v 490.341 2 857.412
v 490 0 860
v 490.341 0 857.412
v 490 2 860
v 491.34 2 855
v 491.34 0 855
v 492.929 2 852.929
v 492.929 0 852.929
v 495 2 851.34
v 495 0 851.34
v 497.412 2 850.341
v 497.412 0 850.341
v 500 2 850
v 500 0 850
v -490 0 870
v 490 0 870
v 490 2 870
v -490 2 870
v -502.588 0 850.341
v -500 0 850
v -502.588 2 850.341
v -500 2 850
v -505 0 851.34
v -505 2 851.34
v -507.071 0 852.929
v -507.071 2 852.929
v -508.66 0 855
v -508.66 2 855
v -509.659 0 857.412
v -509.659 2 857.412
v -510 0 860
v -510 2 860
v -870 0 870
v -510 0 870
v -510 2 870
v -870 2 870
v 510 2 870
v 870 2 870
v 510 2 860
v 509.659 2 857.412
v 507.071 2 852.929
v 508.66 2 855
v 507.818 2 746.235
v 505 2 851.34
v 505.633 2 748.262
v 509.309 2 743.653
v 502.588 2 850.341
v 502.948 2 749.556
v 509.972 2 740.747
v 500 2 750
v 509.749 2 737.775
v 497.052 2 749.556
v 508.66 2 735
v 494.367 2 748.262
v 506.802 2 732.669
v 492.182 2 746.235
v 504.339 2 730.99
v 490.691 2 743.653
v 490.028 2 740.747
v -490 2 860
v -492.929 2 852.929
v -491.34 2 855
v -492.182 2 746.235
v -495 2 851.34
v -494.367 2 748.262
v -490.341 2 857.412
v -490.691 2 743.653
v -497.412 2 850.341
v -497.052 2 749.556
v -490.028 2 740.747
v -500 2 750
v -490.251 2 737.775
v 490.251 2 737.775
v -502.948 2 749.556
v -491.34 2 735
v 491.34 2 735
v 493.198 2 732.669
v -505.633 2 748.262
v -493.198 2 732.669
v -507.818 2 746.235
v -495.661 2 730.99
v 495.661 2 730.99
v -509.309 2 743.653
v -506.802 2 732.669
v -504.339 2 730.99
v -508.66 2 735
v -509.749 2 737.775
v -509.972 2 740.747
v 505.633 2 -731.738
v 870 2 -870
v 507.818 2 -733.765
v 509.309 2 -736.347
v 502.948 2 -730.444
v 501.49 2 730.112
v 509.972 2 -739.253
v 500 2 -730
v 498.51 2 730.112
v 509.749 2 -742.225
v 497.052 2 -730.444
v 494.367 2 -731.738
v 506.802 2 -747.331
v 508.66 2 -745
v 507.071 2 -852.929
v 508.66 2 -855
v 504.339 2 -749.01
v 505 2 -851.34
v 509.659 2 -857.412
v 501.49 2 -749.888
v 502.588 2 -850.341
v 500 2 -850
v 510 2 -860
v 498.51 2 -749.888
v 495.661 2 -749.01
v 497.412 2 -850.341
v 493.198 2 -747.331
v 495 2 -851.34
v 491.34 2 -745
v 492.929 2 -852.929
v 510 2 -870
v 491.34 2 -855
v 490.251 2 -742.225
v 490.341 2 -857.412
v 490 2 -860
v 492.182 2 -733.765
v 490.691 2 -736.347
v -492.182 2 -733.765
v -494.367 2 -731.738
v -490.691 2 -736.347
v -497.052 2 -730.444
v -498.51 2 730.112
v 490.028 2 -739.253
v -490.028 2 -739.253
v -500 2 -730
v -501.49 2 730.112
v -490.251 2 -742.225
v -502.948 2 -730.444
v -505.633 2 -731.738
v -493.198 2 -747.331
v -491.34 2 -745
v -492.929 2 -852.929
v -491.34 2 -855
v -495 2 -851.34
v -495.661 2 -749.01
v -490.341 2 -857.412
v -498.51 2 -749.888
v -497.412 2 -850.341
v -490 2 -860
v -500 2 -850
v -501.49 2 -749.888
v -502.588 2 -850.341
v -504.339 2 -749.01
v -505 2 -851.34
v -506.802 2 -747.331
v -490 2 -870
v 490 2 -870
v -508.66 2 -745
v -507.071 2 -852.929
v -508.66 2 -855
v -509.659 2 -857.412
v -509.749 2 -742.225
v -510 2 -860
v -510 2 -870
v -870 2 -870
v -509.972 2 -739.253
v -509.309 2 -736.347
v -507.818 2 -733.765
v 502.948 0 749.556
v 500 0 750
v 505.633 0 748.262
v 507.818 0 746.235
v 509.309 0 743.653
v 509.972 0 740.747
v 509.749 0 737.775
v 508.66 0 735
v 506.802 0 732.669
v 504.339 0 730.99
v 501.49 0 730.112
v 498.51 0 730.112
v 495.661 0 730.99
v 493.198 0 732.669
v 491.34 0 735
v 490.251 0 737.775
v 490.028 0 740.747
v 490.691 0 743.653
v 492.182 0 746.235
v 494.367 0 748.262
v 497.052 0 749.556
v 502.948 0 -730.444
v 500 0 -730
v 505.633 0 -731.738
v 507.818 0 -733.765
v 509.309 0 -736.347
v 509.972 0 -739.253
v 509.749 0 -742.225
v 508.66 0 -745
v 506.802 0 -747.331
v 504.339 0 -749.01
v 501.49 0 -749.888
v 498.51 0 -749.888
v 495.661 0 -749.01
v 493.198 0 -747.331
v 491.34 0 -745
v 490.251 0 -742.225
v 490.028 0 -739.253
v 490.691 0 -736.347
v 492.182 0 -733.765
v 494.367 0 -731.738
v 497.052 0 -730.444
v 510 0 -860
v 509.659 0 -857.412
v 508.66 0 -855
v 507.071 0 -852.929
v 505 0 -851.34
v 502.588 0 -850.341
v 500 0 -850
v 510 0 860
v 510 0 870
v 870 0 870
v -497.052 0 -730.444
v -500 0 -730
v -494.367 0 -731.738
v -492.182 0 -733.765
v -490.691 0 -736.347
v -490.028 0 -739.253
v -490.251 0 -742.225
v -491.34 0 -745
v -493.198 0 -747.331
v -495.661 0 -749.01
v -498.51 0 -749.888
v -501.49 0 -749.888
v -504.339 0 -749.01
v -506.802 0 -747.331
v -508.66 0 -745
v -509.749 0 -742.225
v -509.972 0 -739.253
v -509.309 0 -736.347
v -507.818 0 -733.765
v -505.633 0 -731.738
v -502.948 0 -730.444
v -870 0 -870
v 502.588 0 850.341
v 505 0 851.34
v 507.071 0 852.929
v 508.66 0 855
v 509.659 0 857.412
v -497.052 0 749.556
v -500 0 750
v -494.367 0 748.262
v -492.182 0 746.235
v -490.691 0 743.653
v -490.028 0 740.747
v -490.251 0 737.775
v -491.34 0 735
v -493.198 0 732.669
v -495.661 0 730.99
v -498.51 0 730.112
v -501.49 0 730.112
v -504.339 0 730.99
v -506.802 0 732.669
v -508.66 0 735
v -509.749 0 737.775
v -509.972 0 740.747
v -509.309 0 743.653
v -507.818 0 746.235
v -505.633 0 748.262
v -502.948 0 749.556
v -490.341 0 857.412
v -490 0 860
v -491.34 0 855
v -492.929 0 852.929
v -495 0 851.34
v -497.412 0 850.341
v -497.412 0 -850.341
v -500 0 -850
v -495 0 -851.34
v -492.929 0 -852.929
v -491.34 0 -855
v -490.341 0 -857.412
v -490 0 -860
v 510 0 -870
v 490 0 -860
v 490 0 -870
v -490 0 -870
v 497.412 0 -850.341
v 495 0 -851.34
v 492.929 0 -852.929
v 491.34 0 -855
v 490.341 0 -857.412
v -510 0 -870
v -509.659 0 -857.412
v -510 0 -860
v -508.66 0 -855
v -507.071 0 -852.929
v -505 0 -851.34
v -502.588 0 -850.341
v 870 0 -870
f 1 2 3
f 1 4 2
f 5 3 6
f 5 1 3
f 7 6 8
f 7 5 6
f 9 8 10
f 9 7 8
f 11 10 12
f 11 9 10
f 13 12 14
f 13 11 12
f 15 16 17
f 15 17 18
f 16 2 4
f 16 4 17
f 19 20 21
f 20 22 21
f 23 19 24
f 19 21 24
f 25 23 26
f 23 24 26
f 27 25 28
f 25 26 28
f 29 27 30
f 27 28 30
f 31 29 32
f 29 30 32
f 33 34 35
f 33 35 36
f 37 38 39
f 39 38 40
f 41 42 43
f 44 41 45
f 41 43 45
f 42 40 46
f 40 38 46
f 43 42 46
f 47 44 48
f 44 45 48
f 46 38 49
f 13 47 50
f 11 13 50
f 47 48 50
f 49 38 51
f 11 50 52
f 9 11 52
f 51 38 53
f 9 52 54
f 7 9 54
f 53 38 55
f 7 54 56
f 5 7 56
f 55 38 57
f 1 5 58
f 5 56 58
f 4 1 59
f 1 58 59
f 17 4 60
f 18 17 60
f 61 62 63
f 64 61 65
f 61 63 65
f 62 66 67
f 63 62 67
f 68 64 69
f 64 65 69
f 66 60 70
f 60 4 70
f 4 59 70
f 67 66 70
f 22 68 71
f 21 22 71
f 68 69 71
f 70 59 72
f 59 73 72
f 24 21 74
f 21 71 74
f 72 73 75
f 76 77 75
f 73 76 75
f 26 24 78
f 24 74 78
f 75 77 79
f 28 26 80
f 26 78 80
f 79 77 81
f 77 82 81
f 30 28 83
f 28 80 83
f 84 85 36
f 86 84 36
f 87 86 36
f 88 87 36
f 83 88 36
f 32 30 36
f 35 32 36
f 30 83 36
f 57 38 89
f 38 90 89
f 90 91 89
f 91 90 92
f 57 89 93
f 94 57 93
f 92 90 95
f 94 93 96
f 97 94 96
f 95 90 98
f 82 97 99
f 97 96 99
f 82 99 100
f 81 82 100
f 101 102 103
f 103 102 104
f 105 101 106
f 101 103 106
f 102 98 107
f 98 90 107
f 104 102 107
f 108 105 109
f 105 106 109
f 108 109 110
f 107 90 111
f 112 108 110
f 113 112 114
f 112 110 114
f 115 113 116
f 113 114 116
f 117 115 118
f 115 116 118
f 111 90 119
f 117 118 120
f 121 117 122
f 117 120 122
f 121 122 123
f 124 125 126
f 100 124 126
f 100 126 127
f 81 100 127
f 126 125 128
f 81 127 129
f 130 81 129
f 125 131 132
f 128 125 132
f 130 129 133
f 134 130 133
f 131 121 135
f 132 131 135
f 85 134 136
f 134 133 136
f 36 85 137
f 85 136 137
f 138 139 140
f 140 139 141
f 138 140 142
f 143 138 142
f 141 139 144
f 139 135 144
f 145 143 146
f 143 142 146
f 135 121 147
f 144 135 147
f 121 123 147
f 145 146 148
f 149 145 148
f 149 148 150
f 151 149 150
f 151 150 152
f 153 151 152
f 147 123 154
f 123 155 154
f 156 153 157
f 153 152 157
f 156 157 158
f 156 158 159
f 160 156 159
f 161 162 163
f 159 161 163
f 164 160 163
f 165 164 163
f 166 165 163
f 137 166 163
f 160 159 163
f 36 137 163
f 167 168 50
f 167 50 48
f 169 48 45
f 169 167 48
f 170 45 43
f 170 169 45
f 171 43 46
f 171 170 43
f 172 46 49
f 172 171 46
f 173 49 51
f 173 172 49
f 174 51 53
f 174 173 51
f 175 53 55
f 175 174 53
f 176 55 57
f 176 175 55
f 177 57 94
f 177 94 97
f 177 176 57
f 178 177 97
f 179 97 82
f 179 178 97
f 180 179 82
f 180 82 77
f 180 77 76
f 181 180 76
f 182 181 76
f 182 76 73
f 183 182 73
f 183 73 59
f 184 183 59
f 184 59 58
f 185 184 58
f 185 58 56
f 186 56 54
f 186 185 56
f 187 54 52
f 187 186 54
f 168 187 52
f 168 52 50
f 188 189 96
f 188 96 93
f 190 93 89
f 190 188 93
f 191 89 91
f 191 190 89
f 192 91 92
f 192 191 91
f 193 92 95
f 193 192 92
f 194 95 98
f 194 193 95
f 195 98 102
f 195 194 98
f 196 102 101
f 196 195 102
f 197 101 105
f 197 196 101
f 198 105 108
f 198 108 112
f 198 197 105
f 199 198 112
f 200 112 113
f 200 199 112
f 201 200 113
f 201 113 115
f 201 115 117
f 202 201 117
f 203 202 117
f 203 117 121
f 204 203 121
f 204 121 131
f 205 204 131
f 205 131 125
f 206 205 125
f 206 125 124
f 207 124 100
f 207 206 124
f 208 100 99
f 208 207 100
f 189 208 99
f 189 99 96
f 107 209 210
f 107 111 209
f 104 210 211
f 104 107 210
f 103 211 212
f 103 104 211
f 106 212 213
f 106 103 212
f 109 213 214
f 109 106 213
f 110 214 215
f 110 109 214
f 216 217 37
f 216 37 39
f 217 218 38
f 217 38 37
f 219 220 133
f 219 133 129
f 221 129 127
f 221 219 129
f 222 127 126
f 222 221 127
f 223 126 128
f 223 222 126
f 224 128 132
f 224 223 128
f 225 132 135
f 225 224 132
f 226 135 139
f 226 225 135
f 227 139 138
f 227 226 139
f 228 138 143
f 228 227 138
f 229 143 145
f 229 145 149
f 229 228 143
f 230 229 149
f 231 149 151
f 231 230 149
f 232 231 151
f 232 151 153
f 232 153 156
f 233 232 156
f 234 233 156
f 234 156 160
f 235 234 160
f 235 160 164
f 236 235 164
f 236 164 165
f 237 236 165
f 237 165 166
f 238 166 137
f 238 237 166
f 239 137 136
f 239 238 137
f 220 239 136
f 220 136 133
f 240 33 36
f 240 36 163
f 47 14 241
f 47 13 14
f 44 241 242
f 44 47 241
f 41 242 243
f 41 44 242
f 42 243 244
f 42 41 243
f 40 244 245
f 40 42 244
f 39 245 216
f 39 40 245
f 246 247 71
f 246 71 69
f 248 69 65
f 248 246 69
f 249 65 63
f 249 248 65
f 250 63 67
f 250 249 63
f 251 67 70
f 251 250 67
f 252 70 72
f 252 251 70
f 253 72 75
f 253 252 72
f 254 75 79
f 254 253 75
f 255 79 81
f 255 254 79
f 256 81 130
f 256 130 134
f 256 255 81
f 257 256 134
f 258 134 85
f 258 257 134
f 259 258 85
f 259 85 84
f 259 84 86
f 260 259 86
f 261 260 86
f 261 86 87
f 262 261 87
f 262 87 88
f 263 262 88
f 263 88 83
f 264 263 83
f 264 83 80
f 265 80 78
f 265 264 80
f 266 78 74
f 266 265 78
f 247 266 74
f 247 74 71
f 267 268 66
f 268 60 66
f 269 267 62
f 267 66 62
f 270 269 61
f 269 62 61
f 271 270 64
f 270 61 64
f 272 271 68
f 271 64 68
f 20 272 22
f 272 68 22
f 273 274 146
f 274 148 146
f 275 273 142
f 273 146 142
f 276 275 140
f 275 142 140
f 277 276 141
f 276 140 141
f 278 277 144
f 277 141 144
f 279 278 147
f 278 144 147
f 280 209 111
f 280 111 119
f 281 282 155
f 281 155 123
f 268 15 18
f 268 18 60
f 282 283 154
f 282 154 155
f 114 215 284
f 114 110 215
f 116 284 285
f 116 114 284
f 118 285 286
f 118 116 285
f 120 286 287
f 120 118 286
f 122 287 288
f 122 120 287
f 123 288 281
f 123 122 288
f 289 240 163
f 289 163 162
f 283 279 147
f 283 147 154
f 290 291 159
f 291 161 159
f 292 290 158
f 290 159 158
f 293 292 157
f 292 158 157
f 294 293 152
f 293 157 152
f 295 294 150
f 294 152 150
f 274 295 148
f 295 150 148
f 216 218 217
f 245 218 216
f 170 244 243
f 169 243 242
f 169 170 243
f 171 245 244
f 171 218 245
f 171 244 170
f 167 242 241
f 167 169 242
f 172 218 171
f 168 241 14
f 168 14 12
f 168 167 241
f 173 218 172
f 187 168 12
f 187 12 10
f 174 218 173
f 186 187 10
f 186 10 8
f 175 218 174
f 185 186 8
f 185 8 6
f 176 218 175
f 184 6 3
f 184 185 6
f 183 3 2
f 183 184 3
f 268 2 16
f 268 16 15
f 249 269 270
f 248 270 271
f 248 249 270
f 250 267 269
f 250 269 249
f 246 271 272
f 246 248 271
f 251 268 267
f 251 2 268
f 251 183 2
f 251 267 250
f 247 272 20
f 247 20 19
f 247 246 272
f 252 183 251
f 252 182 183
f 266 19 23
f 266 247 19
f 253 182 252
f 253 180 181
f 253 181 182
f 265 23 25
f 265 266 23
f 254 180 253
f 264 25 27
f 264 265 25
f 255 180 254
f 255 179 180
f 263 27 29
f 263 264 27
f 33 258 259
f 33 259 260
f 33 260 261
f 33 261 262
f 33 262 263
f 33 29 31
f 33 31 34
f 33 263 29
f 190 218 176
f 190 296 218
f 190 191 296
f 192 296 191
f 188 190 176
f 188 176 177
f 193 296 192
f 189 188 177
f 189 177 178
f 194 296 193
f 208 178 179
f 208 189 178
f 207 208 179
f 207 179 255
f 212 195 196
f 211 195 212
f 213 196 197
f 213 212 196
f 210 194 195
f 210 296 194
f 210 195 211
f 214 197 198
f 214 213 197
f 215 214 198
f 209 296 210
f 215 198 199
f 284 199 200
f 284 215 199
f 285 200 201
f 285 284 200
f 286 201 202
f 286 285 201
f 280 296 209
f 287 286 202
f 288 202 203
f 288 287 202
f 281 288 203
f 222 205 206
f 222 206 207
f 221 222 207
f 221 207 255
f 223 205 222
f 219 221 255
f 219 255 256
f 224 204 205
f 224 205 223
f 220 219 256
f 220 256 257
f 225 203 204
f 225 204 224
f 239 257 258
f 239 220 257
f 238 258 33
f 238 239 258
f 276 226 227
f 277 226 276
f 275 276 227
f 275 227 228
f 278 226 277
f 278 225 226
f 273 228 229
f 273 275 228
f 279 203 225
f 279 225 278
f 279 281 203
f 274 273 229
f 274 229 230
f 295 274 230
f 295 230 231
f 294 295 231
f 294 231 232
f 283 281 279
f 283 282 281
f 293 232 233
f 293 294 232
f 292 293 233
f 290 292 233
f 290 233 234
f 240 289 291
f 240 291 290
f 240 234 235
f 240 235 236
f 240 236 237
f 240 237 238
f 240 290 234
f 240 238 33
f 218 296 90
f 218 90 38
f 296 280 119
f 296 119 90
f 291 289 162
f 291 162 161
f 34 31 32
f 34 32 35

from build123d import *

# Parameters (mm, degrees)
SKETCH1_R           = 10
BOSS_EXTRUDE1_DEPTH = 2
FILLET1_R           = 10


with BuildPart() as part:
    # Sketch1 → Boss-Extrude1 (new body)
    with BuildSketch(Plane(origin=(0, 0, 0), x_dir=(1, 0, 0), z_dir=(0, 1, 0))):
        Polygon((490, -850), (490, -870), (-490, -870), (-490, -850), (-510, -850), (-510, -870), (-870, -870), (-870, 870), (-510, 870), (-510, 850), (-490, 850), (-490, 870), (490, 870), (490, 850), (510, 850), (510, 870), (870, 870), (870, -870), (510, -870), (510, -850), align=None)
        with Locations(Location((-500, 740, 0), (0, 0, 270))):
            Circle(SKETCH1_R, mode=Mode.SUBTRACT)
        with Locations(Location((500, 740, 0), (0, 0, 270))):
            Circle(SKETCH1_R, mode=Mode.SUBTRACT)
        with Locations(Location((500, -740, 0), (0, 0, 270))):
            Circle(SKETCH1_R, mode=Mode.SUBTRACT)
        with Locations(Location((-500, -740, 0), (0, 0, 270))):
            Circle(SKETCH1_R, mode=Mode.SUBTRACT)
    extrude(amount=BOSS_EXTRUDE1_DEPTH)

    # Fillet1
    fillet1_edges = [part.edges().sort_by_distance(p)[0] for p in [
        (490, 1, 850),
        (510, 1, 850),
        (-510, 1, 850),
        (-490, 1, 850),
        (510, 1, -850),
        (490, 1, -850),
        (-510, 1, -850),
        (-490, 1, -850),
    ]]
    fillet(fillet1_edges, radius=FILLET1_R - 0.0001)  # a hair under: the kernel refuses the full size


solid = part.part
